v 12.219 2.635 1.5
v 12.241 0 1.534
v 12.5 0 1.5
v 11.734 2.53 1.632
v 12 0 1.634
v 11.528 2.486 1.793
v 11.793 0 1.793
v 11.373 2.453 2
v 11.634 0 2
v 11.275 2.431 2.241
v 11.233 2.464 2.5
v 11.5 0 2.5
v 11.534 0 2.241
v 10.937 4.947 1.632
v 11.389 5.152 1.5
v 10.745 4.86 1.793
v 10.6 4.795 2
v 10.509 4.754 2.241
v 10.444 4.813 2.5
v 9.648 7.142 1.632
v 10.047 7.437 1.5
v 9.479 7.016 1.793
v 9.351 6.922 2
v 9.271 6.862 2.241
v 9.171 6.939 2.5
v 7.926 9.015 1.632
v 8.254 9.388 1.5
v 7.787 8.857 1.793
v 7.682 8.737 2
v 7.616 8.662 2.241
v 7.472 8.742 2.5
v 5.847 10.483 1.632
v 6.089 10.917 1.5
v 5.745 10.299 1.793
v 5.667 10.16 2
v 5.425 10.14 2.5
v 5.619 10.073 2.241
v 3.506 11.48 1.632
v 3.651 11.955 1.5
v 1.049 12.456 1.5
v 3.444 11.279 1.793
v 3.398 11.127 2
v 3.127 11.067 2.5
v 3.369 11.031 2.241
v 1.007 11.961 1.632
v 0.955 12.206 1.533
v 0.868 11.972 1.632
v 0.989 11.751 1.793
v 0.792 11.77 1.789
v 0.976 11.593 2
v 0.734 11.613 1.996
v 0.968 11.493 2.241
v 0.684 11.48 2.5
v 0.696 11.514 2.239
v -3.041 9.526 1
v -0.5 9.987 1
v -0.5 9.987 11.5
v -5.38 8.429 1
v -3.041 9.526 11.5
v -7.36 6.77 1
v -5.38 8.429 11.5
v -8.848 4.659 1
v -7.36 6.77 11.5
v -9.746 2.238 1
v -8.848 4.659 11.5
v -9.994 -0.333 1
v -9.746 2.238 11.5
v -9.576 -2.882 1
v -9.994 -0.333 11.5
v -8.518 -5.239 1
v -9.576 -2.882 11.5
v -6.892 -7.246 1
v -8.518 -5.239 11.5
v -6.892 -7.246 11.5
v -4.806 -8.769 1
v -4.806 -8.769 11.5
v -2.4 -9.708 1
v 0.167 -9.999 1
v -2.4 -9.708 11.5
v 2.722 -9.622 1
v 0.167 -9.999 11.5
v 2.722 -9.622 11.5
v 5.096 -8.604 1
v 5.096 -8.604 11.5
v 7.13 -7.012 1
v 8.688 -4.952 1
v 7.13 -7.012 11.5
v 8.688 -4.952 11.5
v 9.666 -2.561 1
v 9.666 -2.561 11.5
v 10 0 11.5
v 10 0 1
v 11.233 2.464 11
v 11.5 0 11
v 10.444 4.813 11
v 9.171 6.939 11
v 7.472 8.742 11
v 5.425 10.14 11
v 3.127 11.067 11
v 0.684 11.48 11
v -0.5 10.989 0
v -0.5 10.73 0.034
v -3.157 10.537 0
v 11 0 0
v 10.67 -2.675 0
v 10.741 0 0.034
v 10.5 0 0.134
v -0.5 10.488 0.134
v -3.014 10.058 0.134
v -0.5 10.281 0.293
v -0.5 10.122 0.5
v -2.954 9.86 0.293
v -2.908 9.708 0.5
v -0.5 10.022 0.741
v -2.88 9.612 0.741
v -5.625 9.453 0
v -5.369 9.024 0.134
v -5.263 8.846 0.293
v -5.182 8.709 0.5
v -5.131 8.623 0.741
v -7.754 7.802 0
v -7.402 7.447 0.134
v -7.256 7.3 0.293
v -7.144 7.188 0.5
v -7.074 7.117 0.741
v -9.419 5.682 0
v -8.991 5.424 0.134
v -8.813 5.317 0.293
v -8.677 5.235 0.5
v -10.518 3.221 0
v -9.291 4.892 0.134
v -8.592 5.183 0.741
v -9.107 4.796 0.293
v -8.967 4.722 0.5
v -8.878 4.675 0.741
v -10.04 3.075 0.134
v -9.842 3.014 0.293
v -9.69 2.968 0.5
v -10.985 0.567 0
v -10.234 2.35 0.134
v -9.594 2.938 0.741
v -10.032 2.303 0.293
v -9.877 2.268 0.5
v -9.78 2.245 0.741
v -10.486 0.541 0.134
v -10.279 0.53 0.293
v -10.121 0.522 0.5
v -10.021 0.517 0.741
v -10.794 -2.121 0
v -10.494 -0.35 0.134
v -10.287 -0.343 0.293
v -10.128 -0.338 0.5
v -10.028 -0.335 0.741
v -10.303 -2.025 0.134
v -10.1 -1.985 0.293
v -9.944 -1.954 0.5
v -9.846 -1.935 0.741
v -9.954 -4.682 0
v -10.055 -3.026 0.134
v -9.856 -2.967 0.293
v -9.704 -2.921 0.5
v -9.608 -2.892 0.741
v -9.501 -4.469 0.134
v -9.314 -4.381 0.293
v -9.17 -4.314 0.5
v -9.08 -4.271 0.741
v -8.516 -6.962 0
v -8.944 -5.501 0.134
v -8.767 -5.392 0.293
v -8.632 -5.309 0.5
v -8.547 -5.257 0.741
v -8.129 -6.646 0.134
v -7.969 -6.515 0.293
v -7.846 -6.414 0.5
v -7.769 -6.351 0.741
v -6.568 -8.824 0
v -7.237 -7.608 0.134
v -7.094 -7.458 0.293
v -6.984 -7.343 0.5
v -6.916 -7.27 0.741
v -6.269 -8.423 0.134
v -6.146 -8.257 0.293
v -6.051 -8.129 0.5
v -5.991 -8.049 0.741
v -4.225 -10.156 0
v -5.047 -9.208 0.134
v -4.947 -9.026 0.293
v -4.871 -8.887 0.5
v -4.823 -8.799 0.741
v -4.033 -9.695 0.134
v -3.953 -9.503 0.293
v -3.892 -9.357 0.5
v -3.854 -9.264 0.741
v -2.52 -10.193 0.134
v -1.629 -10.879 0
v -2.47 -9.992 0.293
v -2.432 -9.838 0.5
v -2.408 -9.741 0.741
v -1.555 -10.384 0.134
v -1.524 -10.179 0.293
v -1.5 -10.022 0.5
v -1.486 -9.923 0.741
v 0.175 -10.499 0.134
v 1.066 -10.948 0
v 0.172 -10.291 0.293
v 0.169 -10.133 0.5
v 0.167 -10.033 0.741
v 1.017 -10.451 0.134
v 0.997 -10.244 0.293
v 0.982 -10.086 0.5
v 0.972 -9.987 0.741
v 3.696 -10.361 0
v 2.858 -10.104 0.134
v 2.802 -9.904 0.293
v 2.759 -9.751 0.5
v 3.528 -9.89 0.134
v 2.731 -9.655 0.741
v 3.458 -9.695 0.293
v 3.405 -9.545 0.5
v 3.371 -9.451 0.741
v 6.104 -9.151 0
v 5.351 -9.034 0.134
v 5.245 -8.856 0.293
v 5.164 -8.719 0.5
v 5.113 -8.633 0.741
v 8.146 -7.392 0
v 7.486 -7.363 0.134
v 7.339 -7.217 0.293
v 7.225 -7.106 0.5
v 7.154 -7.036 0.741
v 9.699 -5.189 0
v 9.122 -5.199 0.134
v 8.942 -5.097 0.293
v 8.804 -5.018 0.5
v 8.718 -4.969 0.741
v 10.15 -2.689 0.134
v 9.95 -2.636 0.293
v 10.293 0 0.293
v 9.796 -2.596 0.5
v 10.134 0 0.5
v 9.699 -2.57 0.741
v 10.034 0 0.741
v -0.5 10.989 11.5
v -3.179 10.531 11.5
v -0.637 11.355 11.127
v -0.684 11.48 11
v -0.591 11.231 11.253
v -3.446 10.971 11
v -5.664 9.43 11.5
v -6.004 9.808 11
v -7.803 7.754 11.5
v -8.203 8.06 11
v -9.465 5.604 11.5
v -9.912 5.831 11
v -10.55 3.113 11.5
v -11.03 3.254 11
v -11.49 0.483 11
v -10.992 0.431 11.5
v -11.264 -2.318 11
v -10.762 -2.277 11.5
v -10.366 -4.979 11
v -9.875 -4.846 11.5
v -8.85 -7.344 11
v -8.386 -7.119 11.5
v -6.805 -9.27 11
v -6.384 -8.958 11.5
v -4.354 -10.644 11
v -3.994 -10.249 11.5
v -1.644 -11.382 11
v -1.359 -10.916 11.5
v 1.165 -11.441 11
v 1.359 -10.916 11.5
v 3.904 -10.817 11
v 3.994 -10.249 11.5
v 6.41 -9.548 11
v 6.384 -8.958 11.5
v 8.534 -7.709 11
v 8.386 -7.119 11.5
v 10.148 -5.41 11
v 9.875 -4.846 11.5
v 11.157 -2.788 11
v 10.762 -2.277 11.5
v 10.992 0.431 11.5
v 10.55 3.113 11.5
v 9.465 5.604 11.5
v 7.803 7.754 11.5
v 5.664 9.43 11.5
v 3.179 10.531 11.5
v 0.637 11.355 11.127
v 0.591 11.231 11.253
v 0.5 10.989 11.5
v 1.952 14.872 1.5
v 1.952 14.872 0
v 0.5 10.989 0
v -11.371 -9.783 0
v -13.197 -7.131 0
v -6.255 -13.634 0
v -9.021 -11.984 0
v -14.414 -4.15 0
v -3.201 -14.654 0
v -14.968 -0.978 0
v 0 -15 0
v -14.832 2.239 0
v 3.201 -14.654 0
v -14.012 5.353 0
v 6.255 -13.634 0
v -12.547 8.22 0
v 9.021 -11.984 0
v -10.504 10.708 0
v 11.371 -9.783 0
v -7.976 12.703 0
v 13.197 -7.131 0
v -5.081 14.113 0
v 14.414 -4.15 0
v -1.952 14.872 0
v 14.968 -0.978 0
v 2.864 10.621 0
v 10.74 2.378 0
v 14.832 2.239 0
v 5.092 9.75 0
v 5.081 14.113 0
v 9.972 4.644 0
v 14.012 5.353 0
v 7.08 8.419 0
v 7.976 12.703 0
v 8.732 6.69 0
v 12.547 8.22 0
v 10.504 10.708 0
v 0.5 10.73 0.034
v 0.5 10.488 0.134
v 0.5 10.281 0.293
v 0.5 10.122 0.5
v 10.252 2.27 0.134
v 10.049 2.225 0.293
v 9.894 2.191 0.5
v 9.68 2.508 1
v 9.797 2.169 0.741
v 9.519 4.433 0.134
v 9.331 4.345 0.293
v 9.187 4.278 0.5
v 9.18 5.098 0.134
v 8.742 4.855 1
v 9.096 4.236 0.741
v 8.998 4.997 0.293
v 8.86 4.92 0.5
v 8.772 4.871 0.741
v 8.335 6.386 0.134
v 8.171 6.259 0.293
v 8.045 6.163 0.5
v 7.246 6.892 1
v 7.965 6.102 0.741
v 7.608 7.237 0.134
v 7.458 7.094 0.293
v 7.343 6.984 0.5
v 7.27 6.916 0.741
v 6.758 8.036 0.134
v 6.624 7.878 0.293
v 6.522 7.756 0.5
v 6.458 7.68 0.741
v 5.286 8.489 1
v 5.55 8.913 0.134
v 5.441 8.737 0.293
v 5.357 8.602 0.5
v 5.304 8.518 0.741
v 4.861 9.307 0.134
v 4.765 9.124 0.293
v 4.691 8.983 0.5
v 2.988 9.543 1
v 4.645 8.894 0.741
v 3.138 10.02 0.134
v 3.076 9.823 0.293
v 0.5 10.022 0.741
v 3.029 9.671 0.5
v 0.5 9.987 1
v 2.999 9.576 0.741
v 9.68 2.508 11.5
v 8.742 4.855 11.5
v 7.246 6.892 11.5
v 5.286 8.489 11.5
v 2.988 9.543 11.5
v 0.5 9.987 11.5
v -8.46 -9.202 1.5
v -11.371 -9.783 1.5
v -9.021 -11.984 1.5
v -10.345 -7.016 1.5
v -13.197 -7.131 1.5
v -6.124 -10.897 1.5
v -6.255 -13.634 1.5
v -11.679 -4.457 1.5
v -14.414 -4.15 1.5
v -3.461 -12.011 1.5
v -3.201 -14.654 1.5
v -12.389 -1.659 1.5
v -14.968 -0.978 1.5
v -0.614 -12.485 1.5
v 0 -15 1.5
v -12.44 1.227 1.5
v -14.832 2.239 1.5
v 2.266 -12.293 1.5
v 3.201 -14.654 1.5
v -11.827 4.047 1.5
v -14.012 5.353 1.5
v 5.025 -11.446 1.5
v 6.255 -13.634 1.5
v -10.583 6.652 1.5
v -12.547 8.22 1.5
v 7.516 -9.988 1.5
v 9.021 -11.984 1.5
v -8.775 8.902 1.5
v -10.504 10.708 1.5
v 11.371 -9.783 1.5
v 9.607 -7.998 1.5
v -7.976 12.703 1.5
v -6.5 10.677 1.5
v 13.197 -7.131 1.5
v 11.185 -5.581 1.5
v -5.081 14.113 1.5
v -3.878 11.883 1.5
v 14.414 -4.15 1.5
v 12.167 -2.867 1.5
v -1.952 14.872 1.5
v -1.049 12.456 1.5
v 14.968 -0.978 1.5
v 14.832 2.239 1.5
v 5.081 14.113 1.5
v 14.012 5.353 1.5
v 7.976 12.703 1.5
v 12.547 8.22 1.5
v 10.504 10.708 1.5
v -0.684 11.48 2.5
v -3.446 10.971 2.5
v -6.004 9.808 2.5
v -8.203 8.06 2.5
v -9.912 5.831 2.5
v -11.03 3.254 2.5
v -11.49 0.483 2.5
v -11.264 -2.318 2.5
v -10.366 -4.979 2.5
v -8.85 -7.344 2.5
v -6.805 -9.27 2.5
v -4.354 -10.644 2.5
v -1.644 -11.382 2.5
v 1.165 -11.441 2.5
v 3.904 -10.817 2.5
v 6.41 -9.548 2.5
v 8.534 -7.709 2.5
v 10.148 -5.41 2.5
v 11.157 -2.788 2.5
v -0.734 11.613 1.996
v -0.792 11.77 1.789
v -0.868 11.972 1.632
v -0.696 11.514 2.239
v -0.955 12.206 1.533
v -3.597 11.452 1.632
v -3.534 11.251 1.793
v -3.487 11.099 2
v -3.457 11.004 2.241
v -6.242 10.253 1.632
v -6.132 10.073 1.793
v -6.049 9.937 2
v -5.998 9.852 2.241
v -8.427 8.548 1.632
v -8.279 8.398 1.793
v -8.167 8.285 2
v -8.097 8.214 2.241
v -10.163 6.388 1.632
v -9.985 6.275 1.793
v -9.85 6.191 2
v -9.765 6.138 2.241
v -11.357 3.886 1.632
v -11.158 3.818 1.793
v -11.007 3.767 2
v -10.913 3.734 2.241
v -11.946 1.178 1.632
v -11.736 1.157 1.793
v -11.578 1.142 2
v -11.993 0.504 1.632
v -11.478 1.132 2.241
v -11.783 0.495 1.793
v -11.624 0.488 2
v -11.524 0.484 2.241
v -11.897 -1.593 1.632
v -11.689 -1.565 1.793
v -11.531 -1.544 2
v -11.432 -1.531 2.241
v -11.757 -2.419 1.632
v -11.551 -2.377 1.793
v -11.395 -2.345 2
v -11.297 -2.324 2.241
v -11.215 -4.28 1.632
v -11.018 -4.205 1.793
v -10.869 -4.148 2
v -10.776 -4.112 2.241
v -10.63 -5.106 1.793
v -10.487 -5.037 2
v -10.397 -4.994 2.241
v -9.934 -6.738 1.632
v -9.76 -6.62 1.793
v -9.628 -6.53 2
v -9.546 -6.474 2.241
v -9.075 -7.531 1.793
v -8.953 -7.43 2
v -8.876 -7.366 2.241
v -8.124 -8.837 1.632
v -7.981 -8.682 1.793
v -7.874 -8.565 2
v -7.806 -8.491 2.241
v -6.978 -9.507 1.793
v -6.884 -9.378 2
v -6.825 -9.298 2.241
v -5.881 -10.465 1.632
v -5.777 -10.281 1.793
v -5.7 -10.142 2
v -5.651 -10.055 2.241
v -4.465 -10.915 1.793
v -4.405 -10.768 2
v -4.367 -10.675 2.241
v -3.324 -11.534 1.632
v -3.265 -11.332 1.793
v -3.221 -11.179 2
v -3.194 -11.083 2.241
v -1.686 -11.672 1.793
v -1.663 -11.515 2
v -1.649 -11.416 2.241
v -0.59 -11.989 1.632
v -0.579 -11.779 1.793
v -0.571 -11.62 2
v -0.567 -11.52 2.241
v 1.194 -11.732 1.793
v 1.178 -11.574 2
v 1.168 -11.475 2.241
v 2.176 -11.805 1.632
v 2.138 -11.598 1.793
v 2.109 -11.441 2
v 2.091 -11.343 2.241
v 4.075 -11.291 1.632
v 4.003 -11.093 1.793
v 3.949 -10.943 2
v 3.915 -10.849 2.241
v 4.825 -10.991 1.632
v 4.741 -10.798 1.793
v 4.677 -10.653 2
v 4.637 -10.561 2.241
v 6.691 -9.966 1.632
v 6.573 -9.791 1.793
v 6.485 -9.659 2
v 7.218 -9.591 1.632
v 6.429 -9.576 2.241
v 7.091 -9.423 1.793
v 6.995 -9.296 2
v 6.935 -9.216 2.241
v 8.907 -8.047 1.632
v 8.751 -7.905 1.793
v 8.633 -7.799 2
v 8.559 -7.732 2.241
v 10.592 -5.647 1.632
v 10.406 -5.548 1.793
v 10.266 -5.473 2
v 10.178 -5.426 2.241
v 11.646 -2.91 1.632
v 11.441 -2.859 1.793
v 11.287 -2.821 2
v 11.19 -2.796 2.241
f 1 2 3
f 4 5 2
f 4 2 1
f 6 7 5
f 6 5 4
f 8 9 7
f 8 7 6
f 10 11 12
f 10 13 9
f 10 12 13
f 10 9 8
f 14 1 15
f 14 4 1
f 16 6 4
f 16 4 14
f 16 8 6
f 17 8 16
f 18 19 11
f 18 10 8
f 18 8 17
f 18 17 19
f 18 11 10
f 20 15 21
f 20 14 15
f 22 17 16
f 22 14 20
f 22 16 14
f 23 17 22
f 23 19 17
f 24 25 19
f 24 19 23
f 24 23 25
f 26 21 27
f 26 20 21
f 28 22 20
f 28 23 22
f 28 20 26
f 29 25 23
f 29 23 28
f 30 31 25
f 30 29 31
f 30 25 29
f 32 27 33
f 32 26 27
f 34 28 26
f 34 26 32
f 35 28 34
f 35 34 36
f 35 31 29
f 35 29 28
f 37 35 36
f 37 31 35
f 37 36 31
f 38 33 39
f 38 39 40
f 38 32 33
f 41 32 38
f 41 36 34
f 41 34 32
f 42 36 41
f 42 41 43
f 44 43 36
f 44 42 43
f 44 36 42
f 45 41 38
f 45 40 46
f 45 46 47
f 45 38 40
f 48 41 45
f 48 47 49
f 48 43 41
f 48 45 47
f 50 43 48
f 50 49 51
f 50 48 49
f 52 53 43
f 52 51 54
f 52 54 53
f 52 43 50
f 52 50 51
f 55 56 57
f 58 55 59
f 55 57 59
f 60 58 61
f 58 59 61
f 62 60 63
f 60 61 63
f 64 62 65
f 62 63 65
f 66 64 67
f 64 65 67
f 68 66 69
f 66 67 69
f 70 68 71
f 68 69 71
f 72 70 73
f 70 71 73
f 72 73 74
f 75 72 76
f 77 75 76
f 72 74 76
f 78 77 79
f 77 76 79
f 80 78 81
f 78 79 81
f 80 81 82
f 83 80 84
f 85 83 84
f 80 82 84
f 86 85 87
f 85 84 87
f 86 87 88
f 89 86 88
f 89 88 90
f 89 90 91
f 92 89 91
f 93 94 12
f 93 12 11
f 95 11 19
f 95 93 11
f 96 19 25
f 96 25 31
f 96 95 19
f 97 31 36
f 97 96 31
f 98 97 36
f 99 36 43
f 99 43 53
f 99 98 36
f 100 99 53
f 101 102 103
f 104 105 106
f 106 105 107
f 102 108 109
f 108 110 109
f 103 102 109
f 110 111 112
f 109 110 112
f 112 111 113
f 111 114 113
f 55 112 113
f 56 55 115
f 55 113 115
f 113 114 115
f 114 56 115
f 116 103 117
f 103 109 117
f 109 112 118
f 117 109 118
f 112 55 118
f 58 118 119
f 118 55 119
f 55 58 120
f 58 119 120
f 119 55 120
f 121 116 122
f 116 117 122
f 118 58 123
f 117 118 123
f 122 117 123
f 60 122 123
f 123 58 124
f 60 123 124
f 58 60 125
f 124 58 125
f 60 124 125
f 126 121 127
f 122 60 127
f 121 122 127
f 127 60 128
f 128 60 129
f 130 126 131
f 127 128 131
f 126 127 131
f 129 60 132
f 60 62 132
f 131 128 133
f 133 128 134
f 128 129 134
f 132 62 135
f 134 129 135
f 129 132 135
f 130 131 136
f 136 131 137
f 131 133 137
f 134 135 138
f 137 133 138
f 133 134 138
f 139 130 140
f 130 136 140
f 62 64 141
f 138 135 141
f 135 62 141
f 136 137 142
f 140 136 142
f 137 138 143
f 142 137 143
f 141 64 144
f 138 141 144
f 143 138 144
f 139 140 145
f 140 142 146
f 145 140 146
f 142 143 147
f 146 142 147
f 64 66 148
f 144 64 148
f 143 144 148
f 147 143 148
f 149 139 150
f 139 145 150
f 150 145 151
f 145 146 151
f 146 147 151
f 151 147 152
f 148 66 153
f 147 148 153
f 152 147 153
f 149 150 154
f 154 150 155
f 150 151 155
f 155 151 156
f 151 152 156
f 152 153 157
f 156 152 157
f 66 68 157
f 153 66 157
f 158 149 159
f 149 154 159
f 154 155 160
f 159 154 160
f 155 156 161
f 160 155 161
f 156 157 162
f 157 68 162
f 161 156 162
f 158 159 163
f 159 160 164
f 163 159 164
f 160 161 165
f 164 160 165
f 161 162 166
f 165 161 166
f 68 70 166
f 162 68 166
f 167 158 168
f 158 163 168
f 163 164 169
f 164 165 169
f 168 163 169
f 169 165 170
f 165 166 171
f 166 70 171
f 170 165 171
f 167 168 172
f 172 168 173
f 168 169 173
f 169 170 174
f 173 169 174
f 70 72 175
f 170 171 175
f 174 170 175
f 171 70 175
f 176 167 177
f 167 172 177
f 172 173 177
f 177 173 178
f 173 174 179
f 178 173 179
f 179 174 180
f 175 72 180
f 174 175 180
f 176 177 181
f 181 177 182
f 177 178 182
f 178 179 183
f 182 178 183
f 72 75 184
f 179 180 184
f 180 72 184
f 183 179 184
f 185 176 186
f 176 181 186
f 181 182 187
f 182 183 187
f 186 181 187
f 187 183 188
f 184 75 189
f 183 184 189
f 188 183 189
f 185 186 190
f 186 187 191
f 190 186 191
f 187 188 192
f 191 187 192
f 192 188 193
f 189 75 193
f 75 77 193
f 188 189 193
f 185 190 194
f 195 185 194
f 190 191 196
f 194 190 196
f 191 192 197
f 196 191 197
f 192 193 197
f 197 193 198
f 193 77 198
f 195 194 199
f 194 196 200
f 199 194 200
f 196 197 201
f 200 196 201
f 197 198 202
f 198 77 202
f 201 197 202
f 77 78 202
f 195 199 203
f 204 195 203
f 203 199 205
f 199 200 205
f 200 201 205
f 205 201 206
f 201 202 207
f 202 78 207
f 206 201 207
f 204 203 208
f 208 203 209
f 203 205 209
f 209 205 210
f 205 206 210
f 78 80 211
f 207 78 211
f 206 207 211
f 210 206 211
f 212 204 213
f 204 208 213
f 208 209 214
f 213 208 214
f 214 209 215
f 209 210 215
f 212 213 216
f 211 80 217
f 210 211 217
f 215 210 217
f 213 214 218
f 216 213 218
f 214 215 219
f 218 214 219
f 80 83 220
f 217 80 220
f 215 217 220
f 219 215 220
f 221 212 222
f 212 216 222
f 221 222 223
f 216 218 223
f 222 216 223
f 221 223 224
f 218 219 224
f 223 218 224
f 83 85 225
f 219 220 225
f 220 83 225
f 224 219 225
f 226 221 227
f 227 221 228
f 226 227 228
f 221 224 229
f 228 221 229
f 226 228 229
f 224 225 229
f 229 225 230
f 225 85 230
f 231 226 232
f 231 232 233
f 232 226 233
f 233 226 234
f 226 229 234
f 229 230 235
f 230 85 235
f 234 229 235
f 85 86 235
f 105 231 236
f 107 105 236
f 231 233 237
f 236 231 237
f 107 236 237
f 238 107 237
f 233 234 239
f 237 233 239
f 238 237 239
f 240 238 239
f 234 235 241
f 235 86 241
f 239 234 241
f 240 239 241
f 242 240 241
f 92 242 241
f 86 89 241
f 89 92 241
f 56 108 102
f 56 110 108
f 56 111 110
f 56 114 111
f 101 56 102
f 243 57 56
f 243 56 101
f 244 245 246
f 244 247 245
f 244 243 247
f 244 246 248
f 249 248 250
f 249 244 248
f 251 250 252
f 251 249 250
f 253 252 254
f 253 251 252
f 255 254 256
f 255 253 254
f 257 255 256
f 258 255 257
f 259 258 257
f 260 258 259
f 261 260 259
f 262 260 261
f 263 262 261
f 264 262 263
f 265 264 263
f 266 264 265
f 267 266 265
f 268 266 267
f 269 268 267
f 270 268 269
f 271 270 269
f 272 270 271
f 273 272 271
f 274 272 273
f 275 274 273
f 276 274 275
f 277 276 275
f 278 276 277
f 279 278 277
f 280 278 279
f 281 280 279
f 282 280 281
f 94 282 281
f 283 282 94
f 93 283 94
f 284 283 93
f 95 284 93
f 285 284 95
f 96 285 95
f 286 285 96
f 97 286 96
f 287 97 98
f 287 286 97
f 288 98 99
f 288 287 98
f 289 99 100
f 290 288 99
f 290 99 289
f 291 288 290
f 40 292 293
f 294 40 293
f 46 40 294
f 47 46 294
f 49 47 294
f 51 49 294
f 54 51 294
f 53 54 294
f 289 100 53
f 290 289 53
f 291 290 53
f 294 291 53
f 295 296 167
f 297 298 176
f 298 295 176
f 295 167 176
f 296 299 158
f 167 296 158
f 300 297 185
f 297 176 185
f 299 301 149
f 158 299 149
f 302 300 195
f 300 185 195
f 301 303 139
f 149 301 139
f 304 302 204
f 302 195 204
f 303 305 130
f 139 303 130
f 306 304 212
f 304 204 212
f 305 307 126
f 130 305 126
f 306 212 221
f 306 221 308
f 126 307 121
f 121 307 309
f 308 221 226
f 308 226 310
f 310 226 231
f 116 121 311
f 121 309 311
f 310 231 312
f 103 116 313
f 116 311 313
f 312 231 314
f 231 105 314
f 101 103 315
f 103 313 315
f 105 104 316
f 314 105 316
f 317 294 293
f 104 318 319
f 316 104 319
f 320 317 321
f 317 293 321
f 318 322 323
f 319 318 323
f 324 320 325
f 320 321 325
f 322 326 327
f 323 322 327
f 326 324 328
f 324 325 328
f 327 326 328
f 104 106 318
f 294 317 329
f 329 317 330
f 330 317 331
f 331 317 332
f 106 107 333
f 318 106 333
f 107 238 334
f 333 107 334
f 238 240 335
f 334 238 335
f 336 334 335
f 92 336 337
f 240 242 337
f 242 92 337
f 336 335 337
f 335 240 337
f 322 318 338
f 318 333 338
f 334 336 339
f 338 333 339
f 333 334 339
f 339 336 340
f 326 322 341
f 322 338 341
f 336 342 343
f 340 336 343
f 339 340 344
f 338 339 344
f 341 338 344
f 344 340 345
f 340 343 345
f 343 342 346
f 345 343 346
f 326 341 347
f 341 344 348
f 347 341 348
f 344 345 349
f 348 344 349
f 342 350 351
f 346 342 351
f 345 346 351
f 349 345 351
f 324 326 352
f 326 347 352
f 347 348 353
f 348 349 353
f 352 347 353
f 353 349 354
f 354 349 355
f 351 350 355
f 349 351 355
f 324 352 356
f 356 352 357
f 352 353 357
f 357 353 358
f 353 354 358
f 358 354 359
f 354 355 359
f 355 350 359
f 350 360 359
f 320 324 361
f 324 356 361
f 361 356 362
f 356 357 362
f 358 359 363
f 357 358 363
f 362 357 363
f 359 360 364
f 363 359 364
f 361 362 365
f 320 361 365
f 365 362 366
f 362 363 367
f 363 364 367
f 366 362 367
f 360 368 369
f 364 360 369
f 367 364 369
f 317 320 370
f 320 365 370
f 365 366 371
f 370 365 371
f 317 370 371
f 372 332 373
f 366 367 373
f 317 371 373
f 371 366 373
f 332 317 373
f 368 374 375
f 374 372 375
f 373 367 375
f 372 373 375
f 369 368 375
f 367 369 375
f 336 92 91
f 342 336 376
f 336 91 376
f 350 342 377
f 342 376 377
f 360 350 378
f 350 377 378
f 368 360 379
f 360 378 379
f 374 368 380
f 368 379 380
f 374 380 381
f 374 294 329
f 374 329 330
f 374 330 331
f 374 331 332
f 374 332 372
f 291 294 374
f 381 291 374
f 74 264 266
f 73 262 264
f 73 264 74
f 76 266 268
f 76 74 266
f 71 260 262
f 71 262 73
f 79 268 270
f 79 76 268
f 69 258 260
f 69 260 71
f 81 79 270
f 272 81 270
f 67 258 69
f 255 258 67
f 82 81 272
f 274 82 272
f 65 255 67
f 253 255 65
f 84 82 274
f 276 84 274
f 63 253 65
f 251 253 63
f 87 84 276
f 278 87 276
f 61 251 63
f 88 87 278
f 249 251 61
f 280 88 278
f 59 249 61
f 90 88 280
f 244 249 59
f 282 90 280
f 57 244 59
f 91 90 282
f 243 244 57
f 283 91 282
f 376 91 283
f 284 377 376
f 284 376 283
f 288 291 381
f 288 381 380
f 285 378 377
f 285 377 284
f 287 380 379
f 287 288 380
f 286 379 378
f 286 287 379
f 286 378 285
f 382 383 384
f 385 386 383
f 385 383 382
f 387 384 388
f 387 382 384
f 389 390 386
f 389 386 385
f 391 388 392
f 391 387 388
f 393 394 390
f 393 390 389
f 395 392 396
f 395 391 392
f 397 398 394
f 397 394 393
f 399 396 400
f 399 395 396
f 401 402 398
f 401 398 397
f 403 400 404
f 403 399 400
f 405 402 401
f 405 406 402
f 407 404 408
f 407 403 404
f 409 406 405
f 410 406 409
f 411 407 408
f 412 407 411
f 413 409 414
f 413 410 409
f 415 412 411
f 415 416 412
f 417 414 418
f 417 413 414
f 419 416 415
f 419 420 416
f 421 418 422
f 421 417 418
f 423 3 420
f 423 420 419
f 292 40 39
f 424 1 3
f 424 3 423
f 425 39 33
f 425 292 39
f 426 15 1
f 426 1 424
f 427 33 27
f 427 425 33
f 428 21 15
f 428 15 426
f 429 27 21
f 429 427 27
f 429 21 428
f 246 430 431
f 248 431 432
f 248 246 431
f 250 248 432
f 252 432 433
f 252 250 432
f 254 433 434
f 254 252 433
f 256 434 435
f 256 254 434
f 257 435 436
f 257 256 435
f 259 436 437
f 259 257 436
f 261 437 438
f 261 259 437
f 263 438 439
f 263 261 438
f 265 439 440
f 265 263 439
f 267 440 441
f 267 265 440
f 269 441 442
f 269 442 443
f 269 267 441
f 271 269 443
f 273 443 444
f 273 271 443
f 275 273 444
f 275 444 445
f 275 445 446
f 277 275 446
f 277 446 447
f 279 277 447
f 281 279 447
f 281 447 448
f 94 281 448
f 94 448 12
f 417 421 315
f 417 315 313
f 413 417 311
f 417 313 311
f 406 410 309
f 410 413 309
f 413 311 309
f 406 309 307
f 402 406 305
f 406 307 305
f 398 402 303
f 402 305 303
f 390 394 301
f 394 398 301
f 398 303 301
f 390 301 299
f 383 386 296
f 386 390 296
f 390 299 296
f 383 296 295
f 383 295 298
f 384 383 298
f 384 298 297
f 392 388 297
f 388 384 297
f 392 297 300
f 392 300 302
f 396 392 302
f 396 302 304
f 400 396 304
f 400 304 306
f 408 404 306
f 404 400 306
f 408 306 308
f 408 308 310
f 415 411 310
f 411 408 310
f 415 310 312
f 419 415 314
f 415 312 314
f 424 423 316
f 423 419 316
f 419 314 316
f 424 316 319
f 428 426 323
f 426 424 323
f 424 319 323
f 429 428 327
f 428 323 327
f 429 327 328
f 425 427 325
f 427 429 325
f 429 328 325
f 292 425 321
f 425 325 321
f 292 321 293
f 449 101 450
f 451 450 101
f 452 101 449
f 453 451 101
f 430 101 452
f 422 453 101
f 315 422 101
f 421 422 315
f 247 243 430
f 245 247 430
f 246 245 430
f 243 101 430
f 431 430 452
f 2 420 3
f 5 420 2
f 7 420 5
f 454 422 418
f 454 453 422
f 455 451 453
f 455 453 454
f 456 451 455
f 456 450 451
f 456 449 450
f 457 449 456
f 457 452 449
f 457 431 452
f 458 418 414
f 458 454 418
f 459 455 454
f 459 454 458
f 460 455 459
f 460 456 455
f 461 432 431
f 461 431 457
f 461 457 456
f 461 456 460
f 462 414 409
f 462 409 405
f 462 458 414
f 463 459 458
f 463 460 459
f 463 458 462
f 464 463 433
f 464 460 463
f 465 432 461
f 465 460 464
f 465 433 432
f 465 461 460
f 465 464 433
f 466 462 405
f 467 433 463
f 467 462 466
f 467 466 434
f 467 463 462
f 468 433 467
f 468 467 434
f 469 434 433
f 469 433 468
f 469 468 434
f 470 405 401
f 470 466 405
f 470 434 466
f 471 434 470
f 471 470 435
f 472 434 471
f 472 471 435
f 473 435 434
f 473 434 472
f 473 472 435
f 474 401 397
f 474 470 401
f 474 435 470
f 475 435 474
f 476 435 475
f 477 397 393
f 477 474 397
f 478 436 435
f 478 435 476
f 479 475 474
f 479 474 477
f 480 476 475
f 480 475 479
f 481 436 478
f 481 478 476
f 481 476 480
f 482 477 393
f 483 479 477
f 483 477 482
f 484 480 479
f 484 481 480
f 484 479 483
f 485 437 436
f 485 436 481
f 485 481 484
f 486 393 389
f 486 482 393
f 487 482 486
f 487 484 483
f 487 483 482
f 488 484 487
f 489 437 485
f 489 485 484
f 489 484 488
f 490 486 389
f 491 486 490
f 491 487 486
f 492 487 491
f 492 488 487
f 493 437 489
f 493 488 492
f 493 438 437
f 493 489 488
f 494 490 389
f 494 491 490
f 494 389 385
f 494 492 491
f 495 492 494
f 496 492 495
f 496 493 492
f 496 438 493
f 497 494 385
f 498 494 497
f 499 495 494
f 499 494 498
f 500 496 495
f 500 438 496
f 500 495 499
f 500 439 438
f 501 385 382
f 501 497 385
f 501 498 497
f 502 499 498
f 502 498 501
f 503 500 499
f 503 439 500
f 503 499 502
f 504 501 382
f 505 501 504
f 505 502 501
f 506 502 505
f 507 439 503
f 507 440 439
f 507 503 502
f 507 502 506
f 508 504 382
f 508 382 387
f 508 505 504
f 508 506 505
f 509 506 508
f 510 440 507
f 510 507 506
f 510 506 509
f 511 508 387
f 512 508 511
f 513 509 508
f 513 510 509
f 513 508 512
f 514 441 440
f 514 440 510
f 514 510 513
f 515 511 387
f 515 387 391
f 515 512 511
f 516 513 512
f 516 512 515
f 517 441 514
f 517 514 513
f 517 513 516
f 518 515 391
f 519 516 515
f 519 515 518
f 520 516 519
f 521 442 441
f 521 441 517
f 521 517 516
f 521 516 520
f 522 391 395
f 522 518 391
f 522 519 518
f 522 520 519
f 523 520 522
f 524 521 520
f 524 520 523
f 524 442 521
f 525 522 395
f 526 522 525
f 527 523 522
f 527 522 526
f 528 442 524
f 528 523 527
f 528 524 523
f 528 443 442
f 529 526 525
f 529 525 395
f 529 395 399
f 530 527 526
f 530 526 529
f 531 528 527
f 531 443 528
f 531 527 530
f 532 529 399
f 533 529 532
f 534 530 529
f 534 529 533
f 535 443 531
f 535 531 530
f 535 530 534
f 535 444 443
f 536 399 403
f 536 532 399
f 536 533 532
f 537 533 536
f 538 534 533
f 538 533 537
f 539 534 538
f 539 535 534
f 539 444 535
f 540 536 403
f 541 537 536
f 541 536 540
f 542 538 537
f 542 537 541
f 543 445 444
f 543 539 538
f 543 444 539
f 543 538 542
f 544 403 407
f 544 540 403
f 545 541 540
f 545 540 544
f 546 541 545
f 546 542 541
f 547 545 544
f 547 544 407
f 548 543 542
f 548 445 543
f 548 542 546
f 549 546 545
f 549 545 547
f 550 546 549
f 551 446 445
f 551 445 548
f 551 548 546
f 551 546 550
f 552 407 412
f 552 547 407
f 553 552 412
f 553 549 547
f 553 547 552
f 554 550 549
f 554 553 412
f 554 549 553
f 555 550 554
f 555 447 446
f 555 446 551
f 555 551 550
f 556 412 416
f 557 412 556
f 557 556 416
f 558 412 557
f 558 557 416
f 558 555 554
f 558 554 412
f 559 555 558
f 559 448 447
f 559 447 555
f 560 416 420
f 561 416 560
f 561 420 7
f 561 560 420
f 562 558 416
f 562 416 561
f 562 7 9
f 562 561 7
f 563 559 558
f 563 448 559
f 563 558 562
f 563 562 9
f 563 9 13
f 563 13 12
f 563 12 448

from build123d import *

# Parameters (mm, degrees)
ESQUISSE1_R             = 15
BOSS_EXTRU_1_DEPTH      = 11.5
ESQUISSE2_OUTSIDE_W     = 40.792
ESQUISSE2_OUTSIDE_H     = 40.792
ESQUISSE2_OUTSIDE_R     = 11.5
ENL_V_MAT_EXTRU_1_DEPTH = 10
ENL_V_MAT_EXTRU_2_REACH = 26.13
ESQUISSE3_R             = 10
CONG_1_R                = 1
CONG_2_R                = 1
ENL_V_MAT_EXTRU_3_DEPTH = 25.12985702402731
CHANFREIN1_SIZE         = 0.5


with BuildPart() as part:
    # Esquisse1 → Boss.-Extru.1 (new body)
    with BuildSketch(Plane.XY):
        Circle(ESQUISSE1_R)
    extrude(amount=BOSS_EXTRU_1_DEPTH)

    # Esquisse2 outside → Enlèv. mat.-Extru.1 (cut)
    with BuildSketch(Plane.XY.offset(11.5)):
        Rectangle(ESQUISSE2_OUTSIDE_W, ESQUISSE2_OUTSIDE_H)
        Circle(ESQUISSE2_OUTSIDE_R, mode=Mode.SUBTRACT)
    extrude(amount=-ENL_V_MAT_EXTRU_1_DEPTH, mode=Mode.SUBTRACT)

    # Esquisse3 → Enlèv. mat.-Extru.2 (cut, up to next)
    with BuildSketch(Plane.XY.offset(11.5), mode=Mode.PRIVATE) as enl_v_mat_extru_2_sk1:
        Circle(ESQUISSE3_R)
    enl_v_mat_extru_2_tool1 = extrude(enl_v_mat_extru_2_sk1.sketch, amount=-ENL_V_MAT_EXTRU_2_REACH, mode=Mode.PRIVATE) & part.part
    add(enl_v_mat_extru_2_tool1.solids().sort_by_distance((0, 0, 11.5))[0], mode=Mode.SUBTRACT)

    # Congé1
    cong_1_edges = [part.edges().sort_by_distance(p)[0] for p in [
        (-11.5, 1.41e-15, 1.5),
    ]]
    fillet(cong_1_edges, radius=CONG_1_R)

    # Congé2
    cong_2_edges = [part.edges().sort_by_distance(p)[0] for p in [
        (-10, 1.22e-15, 0),
    ]]
    fillet(cong_2_edges, radius=CONG_2_R)

    # Esquisse4 → Enlèv. mat.-Extru.3 (cut, through all)
    with BuildSketch(Plane.XY.offset(11.5)):
        Polygon((0.5, 9), (-0.5, 9), (-0.5, 10.988630487917954), (-2.0000000000000004, 15), (2, 15), (0.5, 10.988630487917954), align=None)
    extrude(amount=-ENL_V_MAT_EXTRU_3_DEPTH, mode=Mode.SUBTRACT)

    # Chanfrein1
    chanfrein1_edges = [part.edges().sort_by_distance(p)[0] for p in [
        (-7.886330667871463, -8.36993360768113, 11.5),
    ]]
    chamfer(chanfrein1_edges, length=CHANFREIN1_SIZE)


solid = part.part
